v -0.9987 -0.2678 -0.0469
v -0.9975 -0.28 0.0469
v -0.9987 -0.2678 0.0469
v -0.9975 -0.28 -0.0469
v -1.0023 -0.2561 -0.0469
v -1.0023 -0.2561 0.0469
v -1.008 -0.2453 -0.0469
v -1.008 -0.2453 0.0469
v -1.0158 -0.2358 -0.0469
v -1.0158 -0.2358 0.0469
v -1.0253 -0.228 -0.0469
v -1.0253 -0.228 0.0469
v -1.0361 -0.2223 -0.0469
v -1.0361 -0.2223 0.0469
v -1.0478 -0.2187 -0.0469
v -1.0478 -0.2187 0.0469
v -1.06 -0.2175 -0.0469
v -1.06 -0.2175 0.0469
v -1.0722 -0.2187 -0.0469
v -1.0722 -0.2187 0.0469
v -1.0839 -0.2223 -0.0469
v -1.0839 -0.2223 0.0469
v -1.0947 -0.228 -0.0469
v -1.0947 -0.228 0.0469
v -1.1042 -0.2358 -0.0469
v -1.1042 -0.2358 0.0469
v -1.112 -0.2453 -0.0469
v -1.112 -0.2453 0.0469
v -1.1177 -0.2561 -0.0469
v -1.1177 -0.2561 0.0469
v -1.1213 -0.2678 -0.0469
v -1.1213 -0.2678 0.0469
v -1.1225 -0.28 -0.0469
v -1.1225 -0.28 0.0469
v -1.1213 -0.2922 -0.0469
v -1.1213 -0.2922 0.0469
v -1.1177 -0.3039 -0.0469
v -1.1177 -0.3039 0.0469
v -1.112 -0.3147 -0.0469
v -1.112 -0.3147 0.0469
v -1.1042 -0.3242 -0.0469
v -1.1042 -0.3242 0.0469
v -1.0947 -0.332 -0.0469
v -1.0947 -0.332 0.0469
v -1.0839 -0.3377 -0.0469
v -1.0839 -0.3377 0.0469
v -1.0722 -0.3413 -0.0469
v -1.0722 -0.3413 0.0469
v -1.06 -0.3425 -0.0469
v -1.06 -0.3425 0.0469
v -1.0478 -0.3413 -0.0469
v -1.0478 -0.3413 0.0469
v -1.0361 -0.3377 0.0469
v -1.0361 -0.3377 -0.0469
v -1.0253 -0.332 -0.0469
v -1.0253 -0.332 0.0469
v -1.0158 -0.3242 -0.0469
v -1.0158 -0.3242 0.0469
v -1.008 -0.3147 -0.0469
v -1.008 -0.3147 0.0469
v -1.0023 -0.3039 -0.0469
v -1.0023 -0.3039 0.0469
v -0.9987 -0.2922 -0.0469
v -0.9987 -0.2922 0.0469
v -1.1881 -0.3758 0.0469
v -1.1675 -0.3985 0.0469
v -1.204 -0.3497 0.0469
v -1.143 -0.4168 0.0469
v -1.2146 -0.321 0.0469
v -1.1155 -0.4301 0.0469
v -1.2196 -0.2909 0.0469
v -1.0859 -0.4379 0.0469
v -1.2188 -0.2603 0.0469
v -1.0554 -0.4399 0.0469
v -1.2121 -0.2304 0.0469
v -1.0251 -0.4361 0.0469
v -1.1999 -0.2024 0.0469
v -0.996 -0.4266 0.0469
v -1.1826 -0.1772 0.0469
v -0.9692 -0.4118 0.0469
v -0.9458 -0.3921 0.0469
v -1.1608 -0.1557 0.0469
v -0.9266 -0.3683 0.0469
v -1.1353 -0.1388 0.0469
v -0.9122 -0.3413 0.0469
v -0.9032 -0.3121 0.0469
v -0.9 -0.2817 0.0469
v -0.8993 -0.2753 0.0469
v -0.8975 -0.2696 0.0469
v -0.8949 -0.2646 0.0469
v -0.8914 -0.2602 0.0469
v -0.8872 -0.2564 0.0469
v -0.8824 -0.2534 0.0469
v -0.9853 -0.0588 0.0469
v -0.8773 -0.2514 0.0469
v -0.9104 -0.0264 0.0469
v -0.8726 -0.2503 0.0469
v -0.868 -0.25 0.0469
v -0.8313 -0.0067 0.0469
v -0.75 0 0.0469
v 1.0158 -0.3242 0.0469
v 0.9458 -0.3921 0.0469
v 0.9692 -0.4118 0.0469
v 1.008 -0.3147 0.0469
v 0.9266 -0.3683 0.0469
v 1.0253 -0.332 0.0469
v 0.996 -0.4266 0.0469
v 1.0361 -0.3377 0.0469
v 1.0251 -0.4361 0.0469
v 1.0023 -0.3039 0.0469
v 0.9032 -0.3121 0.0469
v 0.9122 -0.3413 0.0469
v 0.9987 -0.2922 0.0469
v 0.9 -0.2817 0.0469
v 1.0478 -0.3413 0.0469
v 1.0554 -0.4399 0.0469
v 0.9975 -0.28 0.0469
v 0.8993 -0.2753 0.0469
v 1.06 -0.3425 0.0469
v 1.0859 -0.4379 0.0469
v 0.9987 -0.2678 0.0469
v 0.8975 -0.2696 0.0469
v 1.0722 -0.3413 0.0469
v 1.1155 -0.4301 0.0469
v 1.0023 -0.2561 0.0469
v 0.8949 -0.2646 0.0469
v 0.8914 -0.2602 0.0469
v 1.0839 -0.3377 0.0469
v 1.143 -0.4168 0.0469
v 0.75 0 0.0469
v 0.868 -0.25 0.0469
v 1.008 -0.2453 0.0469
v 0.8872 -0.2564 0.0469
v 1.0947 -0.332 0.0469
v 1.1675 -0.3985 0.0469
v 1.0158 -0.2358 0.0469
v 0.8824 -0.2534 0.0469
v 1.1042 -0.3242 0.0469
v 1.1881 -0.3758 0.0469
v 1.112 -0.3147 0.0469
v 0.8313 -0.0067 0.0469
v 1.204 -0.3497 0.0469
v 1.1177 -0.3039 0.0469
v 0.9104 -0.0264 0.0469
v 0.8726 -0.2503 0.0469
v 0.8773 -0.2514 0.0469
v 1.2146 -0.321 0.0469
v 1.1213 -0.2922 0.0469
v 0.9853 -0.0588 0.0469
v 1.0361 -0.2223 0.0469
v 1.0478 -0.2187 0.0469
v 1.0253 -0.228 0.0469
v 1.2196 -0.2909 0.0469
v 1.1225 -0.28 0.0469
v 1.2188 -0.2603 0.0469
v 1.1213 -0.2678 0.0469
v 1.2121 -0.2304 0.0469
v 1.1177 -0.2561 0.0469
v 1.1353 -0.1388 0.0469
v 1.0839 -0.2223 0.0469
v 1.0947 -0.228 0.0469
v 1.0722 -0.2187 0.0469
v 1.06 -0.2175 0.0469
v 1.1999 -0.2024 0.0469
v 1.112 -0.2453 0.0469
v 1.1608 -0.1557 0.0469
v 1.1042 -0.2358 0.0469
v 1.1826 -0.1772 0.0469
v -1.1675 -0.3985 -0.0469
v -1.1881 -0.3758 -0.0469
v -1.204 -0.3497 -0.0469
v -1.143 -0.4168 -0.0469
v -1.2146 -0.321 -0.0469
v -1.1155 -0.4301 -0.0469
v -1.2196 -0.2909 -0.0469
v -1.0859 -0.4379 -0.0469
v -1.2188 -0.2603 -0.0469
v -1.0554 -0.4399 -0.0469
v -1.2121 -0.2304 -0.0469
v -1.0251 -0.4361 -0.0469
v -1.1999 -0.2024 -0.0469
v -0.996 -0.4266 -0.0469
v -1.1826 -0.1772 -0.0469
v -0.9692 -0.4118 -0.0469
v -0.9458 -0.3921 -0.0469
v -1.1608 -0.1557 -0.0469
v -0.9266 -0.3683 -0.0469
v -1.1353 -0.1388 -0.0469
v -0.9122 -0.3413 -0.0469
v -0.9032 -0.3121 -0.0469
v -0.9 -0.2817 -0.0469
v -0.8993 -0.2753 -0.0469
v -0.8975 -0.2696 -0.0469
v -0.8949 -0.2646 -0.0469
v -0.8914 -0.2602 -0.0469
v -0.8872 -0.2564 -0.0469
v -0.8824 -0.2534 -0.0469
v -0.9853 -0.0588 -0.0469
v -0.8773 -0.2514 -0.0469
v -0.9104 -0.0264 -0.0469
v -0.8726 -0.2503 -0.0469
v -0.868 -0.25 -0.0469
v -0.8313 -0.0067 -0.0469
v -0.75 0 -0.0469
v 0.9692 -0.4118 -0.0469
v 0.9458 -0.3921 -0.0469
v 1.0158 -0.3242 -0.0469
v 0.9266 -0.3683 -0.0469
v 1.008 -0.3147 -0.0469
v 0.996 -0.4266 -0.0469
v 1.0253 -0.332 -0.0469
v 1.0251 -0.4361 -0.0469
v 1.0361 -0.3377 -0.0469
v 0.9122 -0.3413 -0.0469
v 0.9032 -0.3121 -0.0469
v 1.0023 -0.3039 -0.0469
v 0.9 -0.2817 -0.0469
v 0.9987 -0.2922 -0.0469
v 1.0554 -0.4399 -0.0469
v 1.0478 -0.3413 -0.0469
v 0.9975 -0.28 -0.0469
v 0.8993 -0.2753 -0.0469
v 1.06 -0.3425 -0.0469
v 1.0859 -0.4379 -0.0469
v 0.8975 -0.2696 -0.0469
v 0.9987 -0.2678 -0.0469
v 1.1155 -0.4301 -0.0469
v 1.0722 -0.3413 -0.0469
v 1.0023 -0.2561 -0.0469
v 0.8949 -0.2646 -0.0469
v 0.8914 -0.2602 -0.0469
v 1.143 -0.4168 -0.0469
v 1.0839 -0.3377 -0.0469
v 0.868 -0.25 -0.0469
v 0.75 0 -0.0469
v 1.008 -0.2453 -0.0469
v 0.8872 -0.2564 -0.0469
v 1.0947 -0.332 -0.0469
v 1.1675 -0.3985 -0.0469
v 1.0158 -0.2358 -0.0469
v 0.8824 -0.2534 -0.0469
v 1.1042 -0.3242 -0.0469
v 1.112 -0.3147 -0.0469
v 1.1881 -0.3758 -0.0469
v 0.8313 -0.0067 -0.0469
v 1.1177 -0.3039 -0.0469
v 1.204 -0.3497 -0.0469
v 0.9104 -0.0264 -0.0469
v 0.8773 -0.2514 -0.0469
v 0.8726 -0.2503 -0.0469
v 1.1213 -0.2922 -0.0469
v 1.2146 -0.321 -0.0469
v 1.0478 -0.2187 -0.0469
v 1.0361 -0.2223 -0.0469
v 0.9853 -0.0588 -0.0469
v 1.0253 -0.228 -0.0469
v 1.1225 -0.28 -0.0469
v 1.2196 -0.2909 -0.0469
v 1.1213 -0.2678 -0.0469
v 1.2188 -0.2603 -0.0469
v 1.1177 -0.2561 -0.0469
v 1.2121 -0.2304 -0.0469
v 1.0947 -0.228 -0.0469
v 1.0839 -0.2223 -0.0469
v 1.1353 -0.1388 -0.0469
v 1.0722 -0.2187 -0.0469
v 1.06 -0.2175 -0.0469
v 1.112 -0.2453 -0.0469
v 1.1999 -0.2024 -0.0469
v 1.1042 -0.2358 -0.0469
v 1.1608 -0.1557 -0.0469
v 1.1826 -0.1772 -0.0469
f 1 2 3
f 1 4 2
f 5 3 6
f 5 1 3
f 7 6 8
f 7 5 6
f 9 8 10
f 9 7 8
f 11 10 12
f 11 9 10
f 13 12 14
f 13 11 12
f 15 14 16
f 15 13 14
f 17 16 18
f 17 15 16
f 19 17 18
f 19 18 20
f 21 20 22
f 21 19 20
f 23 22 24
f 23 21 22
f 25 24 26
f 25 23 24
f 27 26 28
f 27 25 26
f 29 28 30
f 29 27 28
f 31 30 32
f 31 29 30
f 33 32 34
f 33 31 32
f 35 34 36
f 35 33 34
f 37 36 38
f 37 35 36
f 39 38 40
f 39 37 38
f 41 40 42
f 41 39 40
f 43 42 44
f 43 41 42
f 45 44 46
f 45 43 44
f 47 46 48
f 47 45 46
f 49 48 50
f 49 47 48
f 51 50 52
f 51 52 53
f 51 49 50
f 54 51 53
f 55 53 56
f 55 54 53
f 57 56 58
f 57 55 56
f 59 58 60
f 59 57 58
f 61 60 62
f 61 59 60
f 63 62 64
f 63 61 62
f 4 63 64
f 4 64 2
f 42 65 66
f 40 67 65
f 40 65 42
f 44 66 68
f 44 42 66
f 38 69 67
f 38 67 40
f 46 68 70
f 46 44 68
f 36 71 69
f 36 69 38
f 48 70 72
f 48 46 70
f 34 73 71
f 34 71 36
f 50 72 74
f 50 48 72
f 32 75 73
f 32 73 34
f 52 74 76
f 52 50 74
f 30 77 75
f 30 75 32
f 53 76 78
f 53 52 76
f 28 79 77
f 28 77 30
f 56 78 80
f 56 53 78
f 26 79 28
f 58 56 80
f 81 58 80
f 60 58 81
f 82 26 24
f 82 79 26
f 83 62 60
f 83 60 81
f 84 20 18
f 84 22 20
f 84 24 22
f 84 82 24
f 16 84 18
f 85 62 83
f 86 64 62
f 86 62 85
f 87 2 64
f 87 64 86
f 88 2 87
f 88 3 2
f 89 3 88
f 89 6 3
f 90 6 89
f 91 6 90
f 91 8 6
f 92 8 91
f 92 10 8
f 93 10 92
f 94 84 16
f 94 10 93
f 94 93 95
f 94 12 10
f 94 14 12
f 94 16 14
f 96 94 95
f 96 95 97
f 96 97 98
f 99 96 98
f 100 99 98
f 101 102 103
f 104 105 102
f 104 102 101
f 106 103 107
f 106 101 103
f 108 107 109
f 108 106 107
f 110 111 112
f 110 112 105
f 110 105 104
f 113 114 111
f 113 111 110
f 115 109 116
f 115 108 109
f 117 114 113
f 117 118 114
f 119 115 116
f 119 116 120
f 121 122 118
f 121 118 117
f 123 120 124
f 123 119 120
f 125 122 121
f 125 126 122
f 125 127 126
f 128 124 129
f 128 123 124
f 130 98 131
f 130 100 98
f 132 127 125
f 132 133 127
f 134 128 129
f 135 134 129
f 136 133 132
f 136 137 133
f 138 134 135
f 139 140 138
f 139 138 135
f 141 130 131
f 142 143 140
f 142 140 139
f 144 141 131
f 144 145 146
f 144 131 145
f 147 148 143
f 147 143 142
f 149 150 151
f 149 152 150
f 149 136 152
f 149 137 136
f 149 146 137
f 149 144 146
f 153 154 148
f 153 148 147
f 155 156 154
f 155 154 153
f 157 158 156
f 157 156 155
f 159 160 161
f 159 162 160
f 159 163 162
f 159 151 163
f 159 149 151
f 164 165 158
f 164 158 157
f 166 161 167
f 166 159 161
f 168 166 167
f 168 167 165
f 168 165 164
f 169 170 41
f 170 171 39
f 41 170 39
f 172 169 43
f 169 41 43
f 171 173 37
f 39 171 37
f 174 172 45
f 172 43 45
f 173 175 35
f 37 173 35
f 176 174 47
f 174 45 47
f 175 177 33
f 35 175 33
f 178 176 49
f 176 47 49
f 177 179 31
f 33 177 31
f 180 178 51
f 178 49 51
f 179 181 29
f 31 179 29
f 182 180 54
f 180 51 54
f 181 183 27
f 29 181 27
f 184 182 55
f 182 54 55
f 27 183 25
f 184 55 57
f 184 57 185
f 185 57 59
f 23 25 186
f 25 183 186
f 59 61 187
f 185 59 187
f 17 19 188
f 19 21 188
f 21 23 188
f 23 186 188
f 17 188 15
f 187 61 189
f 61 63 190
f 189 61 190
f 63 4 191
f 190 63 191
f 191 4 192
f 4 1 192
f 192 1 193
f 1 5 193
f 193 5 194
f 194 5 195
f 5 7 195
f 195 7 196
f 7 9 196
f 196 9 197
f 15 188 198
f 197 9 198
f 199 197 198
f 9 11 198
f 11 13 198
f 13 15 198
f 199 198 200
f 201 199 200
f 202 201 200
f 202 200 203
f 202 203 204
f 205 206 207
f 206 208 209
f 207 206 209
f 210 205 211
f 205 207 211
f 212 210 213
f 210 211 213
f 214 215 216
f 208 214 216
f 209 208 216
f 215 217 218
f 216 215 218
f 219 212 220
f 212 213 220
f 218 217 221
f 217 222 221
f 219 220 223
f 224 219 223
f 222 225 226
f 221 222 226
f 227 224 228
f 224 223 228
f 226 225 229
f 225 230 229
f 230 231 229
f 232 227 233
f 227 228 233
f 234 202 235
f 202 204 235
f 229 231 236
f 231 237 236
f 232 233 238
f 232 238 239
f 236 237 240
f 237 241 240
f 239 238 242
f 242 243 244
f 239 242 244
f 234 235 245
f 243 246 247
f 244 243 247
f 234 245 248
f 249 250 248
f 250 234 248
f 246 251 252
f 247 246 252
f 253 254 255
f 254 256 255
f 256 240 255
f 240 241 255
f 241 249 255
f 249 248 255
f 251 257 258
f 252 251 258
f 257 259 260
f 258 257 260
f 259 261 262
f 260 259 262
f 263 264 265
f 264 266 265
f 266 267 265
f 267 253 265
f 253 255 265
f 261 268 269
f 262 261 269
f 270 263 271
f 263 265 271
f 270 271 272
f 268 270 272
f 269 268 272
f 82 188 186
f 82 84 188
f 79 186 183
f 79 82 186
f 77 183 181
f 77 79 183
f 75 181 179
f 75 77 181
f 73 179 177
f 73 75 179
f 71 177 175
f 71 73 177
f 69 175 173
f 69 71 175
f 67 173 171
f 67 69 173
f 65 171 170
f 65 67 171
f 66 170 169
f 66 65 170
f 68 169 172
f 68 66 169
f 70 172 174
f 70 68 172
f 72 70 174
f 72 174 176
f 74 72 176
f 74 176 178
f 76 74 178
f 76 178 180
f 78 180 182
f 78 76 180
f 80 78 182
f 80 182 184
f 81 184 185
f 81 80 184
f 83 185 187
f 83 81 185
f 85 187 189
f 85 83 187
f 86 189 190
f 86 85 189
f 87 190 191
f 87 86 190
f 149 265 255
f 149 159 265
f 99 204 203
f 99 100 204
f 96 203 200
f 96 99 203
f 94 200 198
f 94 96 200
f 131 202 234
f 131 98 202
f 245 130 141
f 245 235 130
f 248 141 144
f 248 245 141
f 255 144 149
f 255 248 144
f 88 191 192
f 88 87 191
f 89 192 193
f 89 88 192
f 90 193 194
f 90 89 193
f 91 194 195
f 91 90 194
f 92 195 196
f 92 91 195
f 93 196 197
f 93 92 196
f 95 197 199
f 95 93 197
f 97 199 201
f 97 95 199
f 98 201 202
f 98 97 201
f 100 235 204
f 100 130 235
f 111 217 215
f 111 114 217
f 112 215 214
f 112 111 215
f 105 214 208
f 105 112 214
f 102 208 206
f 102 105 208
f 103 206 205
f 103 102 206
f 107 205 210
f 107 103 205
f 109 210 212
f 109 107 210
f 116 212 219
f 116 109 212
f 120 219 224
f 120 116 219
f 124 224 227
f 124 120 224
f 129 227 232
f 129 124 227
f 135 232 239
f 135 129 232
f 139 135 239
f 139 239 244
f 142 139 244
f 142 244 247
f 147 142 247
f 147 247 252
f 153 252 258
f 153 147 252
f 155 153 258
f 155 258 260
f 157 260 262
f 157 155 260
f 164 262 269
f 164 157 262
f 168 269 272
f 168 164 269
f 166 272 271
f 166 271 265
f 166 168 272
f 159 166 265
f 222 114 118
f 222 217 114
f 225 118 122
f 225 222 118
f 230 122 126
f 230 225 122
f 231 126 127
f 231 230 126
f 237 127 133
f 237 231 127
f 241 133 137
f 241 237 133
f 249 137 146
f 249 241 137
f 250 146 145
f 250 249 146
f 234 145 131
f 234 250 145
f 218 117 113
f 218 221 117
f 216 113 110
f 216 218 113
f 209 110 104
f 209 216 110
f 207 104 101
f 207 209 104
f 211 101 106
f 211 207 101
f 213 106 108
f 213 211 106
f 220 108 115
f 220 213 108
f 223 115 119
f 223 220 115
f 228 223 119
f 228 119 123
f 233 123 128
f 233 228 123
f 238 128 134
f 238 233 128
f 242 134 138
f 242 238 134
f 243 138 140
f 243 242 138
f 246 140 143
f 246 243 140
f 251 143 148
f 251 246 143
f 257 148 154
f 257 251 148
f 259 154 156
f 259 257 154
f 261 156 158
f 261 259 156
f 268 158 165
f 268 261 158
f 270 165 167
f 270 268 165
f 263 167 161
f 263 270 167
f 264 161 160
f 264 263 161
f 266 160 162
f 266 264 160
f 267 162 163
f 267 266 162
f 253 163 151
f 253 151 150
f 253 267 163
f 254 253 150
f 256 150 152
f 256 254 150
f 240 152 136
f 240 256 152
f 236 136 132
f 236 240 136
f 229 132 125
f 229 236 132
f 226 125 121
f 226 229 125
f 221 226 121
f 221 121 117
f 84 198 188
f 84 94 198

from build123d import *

# Parameters (mm, degrees)
SKETCH1_R           = 0.0625
BOSS_EXTRUDE1_DEPTH = 0.046875
FILLET1_R           = 0.5
FILLET2_R           = 0.032


with BuildPart() as part:
    # Sketch1 → Boss-Extrude1 (new, symmetric)
    with BuildSketch(Plane.XY):
        with BuildLine():
            Line((0.875, 0), (-0.875, 0))
            Line((-0.875, 0), (-1.135294118, -0.138823529))
            ThreePointArc((-1.135294118, -0.138823529), (-1.142319321, -0.417198868), (-0.9, -0.28))
            Line((-0.9, -0.28), (-0.9, -0.25))
            Line((-0.9, -0.25), (0.9, -0.25))
            Line((0.9, -0.25), (0.9, -0.28))
            ThreePointArc((0.9, -0.28), (1.142319321, -0.417198868), (1.135294118, -0.138823529))
            Line((1.135294118, -0.138823529), (0.875, 0))
        make_face()
        with Locations((-1.06, -0.28)):
            Circle(SKETCH1_R, mode=Mode.SUBTRACT)
        with Locations(Location((1.06, -0.28, 0), (0, 0, 180))):
            Circle(SKETCH1_R, mode=Mode.SUBTRACT)
    extrude(amount=BOSS_EXTRUDE1_DEPTH, both=True)

    # Fillet1
    fillet1_edges = [part.edges().sort_by_distance(p)[0] for p in [
        (-0.875, 0, 0),
        (0.875, 0, 0),
    ]]
    fillet(fillet1_edges, radius=FILLET1_R)

    # Fillet2
    fillet2_edges = [part.edges().sort_by_distance(p)[0] for p in [
        (0.9, -0.25, 0),
        (-0.9, -0.25, 0),
    ]]
    fillet(fillet2_edges, radius=FILLET2_R)


solid = part.part
